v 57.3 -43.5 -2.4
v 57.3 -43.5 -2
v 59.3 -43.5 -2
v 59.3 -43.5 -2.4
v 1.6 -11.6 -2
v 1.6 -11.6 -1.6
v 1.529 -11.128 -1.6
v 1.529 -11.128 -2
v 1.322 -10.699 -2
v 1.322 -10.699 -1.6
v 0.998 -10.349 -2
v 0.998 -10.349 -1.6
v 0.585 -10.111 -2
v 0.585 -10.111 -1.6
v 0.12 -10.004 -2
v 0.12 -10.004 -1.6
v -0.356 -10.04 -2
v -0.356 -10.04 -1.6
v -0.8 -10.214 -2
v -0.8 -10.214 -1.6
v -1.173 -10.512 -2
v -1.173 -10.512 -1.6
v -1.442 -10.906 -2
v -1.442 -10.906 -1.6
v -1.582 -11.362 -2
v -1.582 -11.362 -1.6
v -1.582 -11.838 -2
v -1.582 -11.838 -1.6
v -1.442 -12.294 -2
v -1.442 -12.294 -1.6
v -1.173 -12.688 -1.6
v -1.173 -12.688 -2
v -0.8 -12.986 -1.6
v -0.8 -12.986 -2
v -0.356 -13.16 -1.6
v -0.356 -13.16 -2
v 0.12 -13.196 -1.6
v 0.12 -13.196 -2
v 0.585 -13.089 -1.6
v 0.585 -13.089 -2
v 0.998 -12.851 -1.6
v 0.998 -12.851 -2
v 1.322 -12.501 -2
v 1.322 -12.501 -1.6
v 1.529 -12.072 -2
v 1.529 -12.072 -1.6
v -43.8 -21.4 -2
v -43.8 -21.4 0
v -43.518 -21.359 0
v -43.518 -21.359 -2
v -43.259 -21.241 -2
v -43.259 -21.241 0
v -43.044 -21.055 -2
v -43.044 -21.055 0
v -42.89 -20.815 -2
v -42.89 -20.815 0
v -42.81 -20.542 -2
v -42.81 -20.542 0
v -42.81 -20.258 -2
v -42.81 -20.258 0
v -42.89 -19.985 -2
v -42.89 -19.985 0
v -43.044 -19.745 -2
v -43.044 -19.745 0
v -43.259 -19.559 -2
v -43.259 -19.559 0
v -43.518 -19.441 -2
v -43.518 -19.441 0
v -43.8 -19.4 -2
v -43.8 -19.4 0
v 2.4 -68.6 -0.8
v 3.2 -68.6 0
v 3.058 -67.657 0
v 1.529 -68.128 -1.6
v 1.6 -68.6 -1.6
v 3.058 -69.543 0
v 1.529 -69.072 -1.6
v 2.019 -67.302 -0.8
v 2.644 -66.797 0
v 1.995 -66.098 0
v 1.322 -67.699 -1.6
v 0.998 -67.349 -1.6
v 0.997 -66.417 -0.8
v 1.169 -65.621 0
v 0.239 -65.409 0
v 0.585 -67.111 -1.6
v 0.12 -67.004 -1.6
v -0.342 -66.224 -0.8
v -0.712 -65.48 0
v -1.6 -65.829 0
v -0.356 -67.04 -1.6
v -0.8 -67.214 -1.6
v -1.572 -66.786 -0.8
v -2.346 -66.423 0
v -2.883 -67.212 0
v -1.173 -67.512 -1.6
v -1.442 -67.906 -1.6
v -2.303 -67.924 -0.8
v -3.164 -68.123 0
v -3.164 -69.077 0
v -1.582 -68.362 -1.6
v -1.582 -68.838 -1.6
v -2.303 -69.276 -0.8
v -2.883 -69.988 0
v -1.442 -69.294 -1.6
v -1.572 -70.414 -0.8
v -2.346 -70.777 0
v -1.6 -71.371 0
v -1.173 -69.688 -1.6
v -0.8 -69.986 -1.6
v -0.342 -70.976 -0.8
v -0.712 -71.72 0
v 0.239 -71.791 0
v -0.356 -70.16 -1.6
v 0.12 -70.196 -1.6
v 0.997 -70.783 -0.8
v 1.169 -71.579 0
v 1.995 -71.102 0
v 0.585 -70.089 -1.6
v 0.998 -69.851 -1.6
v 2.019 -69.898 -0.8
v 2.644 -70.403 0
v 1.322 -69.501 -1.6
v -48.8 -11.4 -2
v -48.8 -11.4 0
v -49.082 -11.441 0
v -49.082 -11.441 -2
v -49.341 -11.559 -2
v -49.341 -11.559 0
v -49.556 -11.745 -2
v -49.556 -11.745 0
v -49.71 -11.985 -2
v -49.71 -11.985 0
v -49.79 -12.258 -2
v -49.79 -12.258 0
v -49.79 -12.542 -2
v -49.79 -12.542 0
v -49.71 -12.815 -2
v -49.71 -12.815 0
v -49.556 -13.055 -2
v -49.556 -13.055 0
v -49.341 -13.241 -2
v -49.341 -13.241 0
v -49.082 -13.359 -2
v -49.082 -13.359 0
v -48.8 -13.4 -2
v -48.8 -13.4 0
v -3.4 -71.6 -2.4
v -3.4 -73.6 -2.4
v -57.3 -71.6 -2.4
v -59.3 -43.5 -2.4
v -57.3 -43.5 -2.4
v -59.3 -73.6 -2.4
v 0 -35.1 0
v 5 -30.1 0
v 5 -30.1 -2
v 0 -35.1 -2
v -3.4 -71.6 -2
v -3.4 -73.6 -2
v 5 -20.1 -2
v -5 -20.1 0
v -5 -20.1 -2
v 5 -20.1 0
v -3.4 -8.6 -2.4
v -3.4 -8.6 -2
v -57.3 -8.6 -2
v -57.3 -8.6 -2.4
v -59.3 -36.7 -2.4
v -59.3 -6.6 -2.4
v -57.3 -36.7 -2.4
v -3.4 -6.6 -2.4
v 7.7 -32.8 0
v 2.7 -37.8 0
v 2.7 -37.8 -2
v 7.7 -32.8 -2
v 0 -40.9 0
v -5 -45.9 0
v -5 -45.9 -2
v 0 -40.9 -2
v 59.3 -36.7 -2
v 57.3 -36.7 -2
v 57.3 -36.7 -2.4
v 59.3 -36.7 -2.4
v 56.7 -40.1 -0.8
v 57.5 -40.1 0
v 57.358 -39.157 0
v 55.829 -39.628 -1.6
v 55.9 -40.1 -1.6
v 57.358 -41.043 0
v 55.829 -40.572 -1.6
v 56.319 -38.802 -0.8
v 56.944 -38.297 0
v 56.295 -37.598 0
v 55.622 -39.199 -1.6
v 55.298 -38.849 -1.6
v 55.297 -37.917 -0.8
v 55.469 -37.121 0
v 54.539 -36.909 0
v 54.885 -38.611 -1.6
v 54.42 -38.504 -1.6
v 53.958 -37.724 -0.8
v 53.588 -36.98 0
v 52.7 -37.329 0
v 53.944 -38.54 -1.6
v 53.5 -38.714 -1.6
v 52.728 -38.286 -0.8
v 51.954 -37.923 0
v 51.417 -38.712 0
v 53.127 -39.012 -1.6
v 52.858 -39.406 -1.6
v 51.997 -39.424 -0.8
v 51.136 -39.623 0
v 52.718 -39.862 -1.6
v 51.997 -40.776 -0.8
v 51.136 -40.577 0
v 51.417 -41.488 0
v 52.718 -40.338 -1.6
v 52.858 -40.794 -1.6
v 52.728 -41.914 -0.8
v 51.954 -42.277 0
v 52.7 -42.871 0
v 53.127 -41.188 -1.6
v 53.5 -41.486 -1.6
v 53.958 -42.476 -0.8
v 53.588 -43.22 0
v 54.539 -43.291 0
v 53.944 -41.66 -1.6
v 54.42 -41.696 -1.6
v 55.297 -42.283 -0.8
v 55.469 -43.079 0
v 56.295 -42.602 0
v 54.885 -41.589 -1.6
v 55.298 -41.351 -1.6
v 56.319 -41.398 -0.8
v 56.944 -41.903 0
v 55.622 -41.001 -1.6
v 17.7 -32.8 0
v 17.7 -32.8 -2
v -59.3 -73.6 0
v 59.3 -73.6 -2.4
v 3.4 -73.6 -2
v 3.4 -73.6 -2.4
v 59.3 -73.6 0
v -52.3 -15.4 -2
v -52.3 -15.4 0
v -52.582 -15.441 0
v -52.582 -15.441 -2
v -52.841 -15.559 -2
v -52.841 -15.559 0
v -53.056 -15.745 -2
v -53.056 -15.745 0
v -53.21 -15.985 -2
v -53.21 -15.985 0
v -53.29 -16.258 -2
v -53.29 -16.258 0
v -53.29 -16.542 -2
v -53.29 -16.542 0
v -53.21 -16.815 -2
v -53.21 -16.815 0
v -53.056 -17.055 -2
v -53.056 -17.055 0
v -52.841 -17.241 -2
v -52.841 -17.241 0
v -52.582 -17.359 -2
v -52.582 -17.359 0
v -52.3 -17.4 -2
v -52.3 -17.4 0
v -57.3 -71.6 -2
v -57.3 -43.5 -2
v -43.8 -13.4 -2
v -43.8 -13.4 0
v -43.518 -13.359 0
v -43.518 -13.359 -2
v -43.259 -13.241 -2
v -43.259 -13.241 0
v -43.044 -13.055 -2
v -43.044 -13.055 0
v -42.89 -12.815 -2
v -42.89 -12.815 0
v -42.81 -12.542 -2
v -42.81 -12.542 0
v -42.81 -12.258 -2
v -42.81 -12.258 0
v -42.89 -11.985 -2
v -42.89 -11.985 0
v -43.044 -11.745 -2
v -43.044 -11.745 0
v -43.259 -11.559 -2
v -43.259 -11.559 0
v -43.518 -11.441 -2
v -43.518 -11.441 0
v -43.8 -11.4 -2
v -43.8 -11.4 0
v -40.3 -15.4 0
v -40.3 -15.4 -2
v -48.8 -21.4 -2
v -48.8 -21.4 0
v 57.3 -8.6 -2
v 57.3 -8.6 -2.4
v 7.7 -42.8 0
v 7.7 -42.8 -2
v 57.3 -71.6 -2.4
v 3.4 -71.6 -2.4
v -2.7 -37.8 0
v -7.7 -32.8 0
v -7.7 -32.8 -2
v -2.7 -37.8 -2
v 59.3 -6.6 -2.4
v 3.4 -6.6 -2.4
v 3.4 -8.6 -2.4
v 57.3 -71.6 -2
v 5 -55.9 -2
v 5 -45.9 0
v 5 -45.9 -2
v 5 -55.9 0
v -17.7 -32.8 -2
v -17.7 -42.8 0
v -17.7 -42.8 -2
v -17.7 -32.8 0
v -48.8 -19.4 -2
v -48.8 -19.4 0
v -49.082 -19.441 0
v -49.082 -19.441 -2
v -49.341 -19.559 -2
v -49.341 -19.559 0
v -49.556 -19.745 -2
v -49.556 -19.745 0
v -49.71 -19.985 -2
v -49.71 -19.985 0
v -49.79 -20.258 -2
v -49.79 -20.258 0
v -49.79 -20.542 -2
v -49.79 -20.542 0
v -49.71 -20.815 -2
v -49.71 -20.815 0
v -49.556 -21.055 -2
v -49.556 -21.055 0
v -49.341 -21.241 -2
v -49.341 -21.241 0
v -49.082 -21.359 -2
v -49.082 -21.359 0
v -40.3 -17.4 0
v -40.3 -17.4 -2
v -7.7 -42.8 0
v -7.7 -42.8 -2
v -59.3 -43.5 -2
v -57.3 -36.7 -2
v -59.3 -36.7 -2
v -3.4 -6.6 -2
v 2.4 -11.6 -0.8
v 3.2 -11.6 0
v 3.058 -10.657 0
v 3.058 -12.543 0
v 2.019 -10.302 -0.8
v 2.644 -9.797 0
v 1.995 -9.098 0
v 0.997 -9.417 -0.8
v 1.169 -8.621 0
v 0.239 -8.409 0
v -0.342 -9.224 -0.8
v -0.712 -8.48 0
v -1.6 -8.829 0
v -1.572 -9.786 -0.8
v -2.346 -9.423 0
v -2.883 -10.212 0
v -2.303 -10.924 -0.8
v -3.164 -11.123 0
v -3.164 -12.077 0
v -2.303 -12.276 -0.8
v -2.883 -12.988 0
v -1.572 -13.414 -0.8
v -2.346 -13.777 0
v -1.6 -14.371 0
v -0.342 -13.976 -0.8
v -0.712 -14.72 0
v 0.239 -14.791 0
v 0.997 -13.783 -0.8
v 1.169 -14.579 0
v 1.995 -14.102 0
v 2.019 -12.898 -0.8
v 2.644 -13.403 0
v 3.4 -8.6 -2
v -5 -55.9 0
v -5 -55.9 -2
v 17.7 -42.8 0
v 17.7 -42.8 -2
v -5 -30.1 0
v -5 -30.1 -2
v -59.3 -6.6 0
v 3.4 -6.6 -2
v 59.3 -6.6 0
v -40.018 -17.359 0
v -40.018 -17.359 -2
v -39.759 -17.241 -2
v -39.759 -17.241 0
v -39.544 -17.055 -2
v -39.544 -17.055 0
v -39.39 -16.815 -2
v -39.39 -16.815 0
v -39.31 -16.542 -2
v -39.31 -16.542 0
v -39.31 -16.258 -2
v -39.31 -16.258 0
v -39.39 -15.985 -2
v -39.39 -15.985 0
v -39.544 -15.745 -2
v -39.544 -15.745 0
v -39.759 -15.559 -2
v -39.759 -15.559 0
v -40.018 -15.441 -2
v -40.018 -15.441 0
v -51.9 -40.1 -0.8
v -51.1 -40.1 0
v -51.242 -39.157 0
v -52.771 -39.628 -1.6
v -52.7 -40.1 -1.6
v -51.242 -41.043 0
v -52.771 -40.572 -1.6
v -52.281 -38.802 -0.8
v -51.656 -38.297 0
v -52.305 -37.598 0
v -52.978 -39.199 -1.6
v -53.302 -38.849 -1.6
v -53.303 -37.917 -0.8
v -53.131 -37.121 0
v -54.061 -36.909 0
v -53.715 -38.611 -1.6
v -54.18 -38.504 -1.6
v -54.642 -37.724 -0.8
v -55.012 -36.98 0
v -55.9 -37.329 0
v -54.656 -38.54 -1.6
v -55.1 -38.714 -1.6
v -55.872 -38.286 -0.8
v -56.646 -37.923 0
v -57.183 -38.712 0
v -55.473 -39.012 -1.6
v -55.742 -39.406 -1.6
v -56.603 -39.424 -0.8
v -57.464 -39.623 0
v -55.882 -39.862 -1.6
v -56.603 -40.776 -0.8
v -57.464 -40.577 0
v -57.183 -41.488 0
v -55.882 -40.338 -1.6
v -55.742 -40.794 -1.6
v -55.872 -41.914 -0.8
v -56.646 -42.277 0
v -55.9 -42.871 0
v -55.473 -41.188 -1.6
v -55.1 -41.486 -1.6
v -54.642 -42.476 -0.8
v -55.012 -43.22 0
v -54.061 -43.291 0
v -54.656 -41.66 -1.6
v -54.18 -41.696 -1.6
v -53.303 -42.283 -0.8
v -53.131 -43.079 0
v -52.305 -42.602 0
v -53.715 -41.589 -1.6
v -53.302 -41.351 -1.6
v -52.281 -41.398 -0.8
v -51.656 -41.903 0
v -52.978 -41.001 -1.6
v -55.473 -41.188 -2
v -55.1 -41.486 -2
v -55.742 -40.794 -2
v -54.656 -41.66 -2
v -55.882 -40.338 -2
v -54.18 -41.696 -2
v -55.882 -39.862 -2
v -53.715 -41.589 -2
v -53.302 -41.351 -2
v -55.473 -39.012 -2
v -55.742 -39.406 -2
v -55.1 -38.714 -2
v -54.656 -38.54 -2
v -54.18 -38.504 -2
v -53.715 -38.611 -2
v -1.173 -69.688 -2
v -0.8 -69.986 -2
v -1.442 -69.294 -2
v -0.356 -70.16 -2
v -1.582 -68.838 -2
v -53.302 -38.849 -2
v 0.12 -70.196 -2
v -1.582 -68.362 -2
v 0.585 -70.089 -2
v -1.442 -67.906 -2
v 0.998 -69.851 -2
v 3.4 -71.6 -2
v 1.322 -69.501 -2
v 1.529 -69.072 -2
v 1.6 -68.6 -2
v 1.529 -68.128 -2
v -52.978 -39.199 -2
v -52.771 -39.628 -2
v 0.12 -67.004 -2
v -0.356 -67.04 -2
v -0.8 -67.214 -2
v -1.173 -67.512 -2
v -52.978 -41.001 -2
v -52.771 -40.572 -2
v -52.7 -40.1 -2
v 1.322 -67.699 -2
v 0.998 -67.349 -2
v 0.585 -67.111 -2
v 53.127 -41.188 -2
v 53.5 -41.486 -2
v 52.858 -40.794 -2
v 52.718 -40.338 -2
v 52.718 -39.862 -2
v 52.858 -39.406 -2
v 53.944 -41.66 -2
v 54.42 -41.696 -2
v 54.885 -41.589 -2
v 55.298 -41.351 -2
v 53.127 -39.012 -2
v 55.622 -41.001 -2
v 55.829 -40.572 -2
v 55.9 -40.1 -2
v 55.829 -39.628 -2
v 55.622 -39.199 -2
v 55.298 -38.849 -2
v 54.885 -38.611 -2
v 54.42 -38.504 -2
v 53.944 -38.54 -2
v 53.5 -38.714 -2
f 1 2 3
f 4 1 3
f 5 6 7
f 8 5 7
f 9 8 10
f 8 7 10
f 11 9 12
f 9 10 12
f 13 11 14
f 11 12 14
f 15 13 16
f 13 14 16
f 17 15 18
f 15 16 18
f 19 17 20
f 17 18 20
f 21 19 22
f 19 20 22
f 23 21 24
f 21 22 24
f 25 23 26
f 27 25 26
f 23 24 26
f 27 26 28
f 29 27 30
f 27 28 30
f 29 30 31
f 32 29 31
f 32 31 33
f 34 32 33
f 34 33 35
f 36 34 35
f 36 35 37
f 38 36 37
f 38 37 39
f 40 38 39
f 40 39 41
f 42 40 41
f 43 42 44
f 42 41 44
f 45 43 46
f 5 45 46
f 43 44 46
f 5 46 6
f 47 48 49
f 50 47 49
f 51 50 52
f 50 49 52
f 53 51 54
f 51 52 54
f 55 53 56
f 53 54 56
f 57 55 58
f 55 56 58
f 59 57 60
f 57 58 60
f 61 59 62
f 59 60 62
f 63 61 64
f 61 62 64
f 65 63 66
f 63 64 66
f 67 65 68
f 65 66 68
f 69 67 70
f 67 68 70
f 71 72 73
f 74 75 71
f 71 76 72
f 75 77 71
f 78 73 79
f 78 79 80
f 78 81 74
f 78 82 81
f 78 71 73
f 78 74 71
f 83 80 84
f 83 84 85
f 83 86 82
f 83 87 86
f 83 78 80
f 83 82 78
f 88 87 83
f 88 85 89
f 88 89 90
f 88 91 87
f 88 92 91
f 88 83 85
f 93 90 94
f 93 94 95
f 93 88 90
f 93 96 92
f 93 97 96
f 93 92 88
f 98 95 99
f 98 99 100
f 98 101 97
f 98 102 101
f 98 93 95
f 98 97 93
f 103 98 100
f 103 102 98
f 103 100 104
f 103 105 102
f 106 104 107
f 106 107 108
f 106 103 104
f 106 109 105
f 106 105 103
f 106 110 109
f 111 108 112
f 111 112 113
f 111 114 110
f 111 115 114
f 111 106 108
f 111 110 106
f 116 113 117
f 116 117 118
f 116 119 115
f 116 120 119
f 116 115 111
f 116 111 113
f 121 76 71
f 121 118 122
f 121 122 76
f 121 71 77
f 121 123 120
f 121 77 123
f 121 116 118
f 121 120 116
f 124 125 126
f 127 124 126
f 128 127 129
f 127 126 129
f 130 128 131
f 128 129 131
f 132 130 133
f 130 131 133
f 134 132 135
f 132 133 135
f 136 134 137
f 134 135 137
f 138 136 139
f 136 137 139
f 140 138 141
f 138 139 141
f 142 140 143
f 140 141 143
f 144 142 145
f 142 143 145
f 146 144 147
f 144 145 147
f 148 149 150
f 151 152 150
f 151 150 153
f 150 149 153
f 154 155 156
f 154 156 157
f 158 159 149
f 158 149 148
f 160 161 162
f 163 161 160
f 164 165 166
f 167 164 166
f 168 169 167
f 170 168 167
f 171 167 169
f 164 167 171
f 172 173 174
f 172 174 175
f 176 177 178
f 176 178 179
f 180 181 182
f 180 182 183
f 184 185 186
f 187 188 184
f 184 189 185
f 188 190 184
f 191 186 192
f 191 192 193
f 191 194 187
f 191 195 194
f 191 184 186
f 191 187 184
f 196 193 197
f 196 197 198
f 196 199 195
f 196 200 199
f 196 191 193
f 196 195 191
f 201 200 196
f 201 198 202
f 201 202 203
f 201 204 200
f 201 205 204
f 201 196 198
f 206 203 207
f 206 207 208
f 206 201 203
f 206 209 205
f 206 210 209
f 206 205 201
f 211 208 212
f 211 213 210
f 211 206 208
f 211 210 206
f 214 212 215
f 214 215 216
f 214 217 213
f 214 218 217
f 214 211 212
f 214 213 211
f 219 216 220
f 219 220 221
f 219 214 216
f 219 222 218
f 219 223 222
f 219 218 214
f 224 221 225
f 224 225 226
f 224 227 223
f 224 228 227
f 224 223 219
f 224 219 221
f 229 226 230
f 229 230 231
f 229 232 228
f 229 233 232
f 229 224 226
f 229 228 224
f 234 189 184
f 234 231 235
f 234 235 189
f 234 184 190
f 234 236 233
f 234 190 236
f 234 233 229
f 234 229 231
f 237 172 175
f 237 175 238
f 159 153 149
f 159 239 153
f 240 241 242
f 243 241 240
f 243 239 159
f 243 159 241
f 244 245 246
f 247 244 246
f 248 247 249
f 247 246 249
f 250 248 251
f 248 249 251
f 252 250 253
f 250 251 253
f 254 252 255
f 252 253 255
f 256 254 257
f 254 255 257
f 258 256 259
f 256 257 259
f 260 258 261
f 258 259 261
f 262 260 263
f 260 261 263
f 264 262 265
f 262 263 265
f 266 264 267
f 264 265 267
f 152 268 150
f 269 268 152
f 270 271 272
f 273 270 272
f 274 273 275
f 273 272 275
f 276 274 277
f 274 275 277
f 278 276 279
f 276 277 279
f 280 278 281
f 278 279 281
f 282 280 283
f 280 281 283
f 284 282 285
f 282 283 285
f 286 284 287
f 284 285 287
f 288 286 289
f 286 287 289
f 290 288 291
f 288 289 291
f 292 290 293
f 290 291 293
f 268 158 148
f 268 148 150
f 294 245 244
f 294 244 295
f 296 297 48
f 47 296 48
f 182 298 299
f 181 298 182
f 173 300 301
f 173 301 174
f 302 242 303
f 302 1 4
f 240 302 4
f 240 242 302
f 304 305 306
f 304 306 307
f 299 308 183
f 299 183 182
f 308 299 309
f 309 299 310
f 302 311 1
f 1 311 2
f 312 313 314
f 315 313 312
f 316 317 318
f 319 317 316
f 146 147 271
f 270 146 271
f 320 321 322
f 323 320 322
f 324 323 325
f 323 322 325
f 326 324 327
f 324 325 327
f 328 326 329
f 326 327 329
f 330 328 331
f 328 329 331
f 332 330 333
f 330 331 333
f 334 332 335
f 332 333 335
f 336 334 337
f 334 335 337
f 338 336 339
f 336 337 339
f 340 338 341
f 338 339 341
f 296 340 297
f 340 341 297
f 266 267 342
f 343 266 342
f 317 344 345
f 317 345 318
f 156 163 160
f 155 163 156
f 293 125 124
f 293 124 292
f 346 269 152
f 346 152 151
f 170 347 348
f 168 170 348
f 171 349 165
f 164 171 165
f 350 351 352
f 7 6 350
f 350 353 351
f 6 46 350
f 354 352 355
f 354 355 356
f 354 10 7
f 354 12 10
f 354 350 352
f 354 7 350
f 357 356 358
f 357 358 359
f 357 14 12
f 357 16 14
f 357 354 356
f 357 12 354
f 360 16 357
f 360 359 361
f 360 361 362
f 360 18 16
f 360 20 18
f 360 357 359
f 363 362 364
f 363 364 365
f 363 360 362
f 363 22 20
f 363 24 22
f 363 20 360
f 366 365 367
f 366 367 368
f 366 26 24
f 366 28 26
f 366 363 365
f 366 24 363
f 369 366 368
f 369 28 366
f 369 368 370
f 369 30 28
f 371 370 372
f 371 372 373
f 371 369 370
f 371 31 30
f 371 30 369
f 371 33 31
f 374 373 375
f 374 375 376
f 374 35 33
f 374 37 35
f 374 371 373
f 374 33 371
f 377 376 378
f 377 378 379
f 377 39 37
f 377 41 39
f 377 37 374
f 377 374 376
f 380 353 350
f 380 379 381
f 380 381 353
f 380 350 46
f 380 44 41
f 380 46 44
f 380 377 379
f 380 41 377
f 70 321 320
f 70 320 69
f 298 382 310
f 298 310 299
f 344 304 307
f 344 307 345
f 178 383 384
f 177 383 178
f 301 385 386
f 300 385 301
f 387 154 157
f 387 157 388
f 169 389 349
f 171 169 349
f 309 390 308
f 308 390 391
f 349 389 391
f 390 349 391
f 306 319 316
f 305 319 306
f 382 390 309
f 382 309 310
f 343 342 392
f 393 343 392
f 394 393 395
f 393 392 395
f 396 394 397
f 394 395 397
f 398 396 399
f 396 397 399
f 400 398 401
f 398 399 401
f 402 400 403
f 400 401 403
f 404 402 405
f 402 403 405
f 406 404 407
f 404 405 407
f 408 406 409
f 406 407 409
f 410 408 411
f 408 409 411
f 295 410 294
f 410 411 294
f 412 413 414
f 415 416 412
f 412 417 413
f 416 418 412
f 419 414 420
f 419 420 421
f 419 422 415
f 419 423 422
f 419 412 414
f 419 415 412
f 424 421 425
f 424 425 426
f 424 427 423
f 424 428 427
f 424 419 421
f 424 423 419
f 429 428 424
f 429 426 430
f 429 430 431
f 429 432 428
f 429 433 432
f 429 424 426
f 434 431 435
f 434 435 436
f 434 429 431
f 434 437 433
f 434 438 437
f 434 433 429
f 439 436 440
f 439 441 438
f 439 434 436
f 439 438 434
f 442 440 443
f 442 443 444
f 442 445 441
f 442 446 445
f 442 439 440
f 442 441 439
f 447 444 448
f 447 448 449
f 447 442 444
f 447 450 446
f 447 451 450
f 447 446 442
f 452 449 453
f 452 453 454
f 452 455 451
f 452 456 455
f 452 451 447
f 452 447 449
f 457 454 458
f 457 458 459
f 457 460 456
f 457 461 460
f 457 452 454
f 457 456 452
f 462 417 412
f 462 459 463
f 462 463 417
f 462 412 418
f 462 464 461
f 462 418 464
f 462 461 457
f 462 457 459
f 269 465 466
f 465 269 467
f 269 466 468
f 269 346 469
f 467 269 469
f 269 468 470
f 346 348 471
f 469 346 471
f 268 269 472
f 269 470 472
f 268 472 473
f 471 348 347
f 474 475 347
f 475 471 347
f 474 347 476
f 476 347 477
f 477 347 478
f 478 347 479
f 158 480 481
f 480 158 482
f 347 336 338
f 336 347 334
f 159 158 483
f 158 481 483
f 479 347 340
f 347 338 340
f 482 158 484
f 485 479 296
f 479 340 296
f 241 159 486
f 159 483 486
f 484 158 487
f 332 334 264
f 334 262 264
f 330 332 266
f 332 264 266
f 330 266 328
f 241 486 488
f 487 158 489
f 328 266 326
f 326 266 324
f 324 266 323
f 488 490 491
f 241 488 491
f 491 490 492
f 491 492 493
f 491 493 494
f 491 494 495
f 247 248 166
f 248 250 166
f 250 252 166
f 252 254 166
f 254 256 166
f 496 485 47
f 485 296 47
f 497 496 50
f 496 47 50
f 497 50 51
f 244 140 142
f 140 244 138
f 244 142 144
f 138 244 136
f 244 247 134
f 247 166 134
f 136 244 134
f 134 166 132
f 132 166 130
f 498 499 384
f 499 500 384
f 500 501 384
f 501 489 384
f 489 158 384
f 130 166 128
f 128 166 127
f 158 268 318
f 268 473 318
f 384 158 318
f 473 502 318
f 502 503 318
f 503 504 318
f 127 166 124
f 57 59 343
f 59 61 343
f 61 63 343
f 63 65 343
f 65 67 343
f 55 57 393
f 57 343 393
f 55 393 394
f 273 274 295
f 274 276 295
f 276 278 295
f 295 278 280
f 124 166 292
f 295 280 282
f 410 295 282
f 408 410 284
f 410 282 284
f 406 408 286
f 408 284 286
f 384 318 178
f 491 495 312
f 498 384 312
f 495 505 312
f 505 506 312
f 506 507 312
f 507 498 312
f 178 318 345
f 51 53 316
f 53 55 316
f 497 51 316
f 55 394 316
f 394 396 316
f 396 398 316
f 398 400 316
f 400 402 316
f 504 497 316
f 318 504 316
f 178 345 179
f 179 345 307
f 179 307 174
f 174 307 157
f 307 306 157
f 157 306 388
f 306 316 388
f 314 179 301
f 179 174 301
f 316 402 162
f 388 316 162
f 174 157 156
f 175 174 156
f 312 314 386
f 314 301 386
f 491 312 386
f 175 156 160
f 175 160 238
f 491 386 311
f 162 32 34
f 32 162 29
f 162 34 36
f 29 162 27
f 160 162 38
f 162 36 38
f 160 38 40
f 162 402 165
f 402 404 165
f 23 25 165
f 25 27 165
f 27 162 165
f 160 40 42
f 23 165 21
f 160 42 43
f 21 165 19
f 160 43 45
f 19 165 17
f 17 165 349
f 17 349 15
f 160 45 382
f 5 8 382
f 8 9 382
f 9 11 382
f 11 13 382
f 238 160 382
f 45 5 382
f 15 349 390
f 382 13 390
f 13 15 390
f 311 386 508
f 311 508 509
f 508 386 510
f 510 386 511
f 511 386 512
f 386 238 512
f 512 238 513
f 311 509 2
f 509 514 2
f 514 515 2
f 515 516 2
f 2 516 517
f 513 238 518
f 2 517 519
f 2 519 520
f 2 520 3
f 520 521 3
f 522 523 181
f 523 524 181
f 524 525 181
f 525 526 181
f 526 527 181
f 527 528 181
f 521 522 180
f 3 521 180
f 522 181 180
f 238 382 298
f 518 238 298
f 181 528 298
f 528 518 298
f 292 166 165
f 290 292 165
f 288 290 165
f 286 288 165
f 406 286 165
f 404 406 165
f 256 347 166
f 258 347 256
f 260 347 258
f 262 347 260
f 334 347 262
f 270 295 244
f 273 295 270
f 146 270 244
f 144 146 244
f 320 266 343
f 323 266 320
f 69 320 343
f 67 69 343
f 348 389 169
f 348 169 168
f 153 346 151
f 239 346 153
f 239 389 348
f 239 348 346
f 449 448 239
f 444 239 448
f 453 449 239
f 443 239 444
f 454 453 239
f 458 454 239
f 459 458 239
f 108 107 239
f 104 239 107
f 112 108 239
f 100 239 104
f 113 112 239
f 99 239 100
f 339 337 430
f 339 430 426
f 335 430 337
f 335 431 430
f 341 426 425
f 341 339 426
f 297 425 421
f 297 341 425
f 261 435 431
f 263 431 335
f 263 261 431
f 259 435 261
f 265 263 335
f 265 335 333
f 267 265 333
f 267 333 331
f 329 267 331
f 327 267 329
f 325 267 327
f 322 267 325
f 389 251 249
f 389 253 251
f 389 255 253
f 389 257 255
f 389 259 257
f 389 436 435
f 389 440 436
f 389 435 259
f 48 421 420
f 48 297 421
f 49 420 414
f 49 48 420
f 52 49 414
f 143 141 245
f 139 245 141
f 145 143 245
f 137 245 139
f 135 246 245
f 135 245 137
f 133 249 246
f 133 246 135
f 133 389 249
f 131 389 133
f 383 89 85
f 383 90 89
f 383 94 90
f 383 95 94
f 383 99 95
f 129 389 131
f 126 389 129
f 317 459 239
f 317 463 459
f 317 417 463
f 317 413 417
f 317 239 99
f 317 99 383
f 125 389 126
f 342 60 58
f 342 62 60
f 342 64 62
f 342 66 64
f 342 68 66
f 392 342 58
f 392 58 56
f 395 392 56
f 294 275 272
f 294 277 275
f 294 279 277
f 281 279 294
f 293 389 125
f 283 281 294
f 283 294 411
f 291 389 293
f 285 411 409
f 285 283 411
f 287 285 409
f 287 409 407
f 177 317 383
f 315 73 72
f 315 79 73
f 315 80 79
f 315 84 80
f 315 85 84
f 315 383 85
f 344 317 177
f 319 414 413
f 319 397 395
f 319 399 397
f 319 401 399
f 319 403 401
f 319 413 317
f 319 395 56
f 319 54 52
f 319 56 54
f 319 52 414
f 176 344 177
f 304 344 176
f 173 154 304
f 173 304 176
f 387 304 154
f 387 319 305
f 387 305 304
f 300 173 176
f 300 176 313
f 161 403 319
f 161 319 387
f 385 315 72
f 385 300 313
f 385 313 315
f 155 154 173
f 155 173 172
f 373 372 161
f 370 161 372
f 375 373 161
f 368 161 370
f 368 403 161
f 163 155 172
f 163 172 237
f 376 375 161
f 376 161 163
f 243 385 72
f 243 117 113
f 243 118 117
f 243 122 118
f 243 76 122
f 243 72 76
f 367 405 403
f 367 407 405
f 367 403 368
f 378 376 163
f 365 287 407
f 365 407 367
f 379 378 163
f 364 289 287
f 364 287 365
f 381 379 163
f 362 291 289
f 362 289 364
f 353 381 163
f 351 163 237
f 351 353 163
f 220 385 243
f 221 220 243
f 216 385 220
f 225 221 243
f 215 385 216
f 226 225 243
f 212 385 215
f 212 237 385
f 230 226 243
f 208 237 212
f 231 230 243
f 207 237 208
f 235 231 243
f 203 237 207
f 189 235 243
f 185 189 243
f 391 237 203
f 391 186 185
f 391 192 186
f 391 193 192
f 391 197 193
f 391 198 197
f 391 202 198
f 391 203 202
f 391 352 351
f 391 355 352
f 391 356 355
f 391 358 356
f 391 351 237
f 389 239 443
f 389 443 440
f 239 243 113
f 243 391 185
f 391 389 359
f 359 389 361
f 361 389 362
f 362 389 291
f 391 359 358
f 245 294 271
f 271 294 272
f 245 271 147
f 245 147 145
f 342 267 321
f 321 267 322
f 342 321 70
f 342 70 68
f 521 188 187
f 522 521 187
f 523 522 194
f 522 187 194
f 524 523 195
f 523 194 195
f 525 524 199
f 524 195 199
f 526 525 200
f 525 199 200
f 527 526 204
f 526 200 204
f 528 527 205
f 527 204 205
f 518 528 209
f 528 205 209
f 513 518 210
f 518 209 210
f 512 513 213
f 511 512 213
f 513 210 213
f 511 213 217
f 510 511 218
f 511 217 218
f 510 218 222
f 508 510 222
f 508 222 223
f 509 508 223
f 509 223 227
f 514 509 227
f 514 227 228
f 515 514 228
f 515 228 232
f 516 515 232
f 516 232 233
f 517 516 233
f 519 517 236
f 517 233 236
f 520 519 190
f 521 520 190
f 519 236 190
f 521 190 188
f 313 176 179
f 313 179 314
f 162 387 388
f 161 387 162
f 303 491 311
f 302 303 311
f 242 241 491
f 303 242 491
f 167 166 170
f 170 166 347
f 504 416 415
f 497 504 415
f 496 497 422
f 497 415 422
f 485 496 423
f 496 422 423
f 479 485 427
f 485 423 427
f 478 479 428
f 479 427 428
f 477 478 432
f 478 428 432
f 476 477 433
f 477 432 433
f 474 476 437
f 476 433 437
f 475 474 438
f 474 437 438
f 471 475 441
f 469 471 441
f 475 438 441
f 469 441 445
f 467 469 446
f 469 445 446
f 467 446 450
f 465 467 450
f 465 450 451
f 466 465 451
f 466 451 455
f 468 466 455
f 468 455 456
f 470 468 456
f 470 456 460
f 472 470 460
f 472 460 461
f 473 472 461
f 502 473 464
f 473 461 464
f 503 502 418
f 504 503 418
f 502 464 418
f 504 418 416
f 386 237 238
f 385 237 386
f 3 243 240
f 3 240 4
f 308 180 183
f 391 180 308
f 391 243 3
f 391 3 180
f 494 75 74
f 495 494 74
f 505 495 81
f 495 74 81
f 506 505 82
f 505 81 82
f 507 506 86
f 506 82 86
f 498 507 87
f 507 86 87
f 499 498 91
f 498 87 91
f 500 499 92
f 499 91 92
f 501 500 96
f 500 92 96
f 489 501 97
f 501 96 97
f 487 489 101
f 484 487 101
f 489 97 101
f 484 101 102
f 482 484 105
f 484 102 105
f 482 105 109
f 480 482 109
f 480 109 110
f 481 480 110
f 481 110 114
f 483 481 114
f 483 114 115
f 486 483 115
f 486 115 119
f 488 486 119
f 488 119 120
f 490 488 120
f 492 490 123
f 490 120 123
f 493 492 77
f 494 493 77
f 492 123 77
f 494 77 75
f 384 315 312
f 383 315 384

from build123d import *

# Parameters (mm, degrees)
SKETCH049_W     = 118.6
SKETCH049_H     = 67
PAD008_DEPTH    = 2
SKETCH050_R     = 1.6
POCKET017_DEPTH = 2
CHAMFER001_SIZE = 1.6
PAD018_DEPTH    = 0.4
POCKET023_DEPTH = 2.401


with BuildPart() as part:
    # Sketch049 → Pad008 (new body)
    with BuildSketch(Plane.XY):
        with Locations((0, -40.1)):
            Rectangle(SKETCH049_W, SKETCH049_H)
    extrude(amount=-PAD008_DEPTH)

    # Sketch050 (on Face5 of Pad008) → Pocket017 (cut)
    with BuildSketch(Plane.XY):
        with Locations((0, -11.6)):
            Circle(SKETCH050_R)
        with Locations((54.3, -40.1)):
            Circle(SKETCH050_R)
        with Locations((-54.3, -40.1)):
            Circle(SKETCH050_R)
        with Locations((0, -68.6)):
            Circle(SKETCH050_R)
    extrude(amount=-POCKET017_DEPTH, mode=Mode.SUBTRACT)

    # Chamfer001
    chamfer001_edges = [part.edges().sort_by_distance(p)[0] for p in [
        (-55.9, -40.1, 0),
        (-1.6, -11.6, 0),
        (52.7, -40.1, 0),
        (-1.6, -68.6, 0),
    ]]
    chamfer(chamfer001_edges, length=CHAMFER001_SIZE)

    # Sketch052 (on Face11 of Chamfer001) → Pad018 (join)
    with BuildSketch(Plane(origin=(0, 0, -2), x_dir=(1, 0, 0), z_dir=(0, 0, -1))):
        Polygon((-59.3, 73.6), (-3.4, 73.6), (-3.4, 71.6), (-57.3, 71.6), (-57.3, 43.5), (-59.3, 43.5), align=None)
        Polygon((59.3, 73.6), (3.4, 73.6), (3.4, 71.6), (57.3, 71.6), (57.3, 43.5), (59.3, 43.5), align=None)
        Polygon((59.3, 6.6), (3.4, 6.6), (3.4, 8.6), (57.3, 8.6), (57.3, 36.7), (59.3, 36.7), align=None)
        Polygon((-59.3, 6.6), (-3.4, 6.6), (-3.4, 8.6), (-57.3, 8.6), (-57.3, 36.7), (-59.3, 36.7), align=None)
    extrude(amount=PAD018_DEPTH)

    # Sketch065 (on Face1 of Pad018) → Pocket023 (cut, through all)
    with BuildSketch(Plane.XY):
        with BuildLine():
            ThreePointArc((-48.8, -11.4), (-49.8, -12.4), (-48.8, -13.4))
            Line((-48.8, -13.4), (-43.8, -13.4))
            ThreePointArc((-43.8, -13.4), (-42.8, -12.4), (-43.8, -11.4))
            Line((-48.8, -11.4), (-43.8, -11.4))
        make_face()
        with BuildLine():
            ThreePointArc((-52.3, -15.4), (-53.3, -16.4), (-52.3, -17.4))
            Line((-52.3, -17.4), (-40.3, -17.4))
            ThreePointArc((-40.3, -17.4), (-39.3, -16.4), (-40.3, -15.4))
            Line((-52.3, -15.4), (-40.3, -15.4))
        make_face()
        with BuildLine():
            ThreePointArc((-48.8, -19.4), (-49.8, -20.4), (-48.8, -21.4))
            Line((-48.8, -21.4), (-43.8, -21.4))
            ThreePointArc((-43.8, -21.4), (-42.8, -20.4), (-43.8, -19.4))
            Line((-48.8, -19.4), (-43.8, -19.4))
        make_face()
        Polygon((-17.7, -32.8), (-7.7, -32.8), (-2.7, -37.8), (-7.7, -42.8), (-17.7, -42.8), align=None)
        Polygon((-5, -20.1), (5, -20.1), (5, -30.1), (0, -35.1), (-5, -30.1), align=None)
        Polygon((7.7, -32.8), (17.7, -32.8), (17.7, -42.8), (7.7, -42.8), (2.7, -37.8), align=None)
        Polygon((5, -45.9), (5, -55.9), (-5, -55.9), (-5, -45.9), (0, -40.9), align=None)
    extrude(amount=-POCKET023_DEPTH, mode=Mode.SUBTRACT)


solid = part.part
